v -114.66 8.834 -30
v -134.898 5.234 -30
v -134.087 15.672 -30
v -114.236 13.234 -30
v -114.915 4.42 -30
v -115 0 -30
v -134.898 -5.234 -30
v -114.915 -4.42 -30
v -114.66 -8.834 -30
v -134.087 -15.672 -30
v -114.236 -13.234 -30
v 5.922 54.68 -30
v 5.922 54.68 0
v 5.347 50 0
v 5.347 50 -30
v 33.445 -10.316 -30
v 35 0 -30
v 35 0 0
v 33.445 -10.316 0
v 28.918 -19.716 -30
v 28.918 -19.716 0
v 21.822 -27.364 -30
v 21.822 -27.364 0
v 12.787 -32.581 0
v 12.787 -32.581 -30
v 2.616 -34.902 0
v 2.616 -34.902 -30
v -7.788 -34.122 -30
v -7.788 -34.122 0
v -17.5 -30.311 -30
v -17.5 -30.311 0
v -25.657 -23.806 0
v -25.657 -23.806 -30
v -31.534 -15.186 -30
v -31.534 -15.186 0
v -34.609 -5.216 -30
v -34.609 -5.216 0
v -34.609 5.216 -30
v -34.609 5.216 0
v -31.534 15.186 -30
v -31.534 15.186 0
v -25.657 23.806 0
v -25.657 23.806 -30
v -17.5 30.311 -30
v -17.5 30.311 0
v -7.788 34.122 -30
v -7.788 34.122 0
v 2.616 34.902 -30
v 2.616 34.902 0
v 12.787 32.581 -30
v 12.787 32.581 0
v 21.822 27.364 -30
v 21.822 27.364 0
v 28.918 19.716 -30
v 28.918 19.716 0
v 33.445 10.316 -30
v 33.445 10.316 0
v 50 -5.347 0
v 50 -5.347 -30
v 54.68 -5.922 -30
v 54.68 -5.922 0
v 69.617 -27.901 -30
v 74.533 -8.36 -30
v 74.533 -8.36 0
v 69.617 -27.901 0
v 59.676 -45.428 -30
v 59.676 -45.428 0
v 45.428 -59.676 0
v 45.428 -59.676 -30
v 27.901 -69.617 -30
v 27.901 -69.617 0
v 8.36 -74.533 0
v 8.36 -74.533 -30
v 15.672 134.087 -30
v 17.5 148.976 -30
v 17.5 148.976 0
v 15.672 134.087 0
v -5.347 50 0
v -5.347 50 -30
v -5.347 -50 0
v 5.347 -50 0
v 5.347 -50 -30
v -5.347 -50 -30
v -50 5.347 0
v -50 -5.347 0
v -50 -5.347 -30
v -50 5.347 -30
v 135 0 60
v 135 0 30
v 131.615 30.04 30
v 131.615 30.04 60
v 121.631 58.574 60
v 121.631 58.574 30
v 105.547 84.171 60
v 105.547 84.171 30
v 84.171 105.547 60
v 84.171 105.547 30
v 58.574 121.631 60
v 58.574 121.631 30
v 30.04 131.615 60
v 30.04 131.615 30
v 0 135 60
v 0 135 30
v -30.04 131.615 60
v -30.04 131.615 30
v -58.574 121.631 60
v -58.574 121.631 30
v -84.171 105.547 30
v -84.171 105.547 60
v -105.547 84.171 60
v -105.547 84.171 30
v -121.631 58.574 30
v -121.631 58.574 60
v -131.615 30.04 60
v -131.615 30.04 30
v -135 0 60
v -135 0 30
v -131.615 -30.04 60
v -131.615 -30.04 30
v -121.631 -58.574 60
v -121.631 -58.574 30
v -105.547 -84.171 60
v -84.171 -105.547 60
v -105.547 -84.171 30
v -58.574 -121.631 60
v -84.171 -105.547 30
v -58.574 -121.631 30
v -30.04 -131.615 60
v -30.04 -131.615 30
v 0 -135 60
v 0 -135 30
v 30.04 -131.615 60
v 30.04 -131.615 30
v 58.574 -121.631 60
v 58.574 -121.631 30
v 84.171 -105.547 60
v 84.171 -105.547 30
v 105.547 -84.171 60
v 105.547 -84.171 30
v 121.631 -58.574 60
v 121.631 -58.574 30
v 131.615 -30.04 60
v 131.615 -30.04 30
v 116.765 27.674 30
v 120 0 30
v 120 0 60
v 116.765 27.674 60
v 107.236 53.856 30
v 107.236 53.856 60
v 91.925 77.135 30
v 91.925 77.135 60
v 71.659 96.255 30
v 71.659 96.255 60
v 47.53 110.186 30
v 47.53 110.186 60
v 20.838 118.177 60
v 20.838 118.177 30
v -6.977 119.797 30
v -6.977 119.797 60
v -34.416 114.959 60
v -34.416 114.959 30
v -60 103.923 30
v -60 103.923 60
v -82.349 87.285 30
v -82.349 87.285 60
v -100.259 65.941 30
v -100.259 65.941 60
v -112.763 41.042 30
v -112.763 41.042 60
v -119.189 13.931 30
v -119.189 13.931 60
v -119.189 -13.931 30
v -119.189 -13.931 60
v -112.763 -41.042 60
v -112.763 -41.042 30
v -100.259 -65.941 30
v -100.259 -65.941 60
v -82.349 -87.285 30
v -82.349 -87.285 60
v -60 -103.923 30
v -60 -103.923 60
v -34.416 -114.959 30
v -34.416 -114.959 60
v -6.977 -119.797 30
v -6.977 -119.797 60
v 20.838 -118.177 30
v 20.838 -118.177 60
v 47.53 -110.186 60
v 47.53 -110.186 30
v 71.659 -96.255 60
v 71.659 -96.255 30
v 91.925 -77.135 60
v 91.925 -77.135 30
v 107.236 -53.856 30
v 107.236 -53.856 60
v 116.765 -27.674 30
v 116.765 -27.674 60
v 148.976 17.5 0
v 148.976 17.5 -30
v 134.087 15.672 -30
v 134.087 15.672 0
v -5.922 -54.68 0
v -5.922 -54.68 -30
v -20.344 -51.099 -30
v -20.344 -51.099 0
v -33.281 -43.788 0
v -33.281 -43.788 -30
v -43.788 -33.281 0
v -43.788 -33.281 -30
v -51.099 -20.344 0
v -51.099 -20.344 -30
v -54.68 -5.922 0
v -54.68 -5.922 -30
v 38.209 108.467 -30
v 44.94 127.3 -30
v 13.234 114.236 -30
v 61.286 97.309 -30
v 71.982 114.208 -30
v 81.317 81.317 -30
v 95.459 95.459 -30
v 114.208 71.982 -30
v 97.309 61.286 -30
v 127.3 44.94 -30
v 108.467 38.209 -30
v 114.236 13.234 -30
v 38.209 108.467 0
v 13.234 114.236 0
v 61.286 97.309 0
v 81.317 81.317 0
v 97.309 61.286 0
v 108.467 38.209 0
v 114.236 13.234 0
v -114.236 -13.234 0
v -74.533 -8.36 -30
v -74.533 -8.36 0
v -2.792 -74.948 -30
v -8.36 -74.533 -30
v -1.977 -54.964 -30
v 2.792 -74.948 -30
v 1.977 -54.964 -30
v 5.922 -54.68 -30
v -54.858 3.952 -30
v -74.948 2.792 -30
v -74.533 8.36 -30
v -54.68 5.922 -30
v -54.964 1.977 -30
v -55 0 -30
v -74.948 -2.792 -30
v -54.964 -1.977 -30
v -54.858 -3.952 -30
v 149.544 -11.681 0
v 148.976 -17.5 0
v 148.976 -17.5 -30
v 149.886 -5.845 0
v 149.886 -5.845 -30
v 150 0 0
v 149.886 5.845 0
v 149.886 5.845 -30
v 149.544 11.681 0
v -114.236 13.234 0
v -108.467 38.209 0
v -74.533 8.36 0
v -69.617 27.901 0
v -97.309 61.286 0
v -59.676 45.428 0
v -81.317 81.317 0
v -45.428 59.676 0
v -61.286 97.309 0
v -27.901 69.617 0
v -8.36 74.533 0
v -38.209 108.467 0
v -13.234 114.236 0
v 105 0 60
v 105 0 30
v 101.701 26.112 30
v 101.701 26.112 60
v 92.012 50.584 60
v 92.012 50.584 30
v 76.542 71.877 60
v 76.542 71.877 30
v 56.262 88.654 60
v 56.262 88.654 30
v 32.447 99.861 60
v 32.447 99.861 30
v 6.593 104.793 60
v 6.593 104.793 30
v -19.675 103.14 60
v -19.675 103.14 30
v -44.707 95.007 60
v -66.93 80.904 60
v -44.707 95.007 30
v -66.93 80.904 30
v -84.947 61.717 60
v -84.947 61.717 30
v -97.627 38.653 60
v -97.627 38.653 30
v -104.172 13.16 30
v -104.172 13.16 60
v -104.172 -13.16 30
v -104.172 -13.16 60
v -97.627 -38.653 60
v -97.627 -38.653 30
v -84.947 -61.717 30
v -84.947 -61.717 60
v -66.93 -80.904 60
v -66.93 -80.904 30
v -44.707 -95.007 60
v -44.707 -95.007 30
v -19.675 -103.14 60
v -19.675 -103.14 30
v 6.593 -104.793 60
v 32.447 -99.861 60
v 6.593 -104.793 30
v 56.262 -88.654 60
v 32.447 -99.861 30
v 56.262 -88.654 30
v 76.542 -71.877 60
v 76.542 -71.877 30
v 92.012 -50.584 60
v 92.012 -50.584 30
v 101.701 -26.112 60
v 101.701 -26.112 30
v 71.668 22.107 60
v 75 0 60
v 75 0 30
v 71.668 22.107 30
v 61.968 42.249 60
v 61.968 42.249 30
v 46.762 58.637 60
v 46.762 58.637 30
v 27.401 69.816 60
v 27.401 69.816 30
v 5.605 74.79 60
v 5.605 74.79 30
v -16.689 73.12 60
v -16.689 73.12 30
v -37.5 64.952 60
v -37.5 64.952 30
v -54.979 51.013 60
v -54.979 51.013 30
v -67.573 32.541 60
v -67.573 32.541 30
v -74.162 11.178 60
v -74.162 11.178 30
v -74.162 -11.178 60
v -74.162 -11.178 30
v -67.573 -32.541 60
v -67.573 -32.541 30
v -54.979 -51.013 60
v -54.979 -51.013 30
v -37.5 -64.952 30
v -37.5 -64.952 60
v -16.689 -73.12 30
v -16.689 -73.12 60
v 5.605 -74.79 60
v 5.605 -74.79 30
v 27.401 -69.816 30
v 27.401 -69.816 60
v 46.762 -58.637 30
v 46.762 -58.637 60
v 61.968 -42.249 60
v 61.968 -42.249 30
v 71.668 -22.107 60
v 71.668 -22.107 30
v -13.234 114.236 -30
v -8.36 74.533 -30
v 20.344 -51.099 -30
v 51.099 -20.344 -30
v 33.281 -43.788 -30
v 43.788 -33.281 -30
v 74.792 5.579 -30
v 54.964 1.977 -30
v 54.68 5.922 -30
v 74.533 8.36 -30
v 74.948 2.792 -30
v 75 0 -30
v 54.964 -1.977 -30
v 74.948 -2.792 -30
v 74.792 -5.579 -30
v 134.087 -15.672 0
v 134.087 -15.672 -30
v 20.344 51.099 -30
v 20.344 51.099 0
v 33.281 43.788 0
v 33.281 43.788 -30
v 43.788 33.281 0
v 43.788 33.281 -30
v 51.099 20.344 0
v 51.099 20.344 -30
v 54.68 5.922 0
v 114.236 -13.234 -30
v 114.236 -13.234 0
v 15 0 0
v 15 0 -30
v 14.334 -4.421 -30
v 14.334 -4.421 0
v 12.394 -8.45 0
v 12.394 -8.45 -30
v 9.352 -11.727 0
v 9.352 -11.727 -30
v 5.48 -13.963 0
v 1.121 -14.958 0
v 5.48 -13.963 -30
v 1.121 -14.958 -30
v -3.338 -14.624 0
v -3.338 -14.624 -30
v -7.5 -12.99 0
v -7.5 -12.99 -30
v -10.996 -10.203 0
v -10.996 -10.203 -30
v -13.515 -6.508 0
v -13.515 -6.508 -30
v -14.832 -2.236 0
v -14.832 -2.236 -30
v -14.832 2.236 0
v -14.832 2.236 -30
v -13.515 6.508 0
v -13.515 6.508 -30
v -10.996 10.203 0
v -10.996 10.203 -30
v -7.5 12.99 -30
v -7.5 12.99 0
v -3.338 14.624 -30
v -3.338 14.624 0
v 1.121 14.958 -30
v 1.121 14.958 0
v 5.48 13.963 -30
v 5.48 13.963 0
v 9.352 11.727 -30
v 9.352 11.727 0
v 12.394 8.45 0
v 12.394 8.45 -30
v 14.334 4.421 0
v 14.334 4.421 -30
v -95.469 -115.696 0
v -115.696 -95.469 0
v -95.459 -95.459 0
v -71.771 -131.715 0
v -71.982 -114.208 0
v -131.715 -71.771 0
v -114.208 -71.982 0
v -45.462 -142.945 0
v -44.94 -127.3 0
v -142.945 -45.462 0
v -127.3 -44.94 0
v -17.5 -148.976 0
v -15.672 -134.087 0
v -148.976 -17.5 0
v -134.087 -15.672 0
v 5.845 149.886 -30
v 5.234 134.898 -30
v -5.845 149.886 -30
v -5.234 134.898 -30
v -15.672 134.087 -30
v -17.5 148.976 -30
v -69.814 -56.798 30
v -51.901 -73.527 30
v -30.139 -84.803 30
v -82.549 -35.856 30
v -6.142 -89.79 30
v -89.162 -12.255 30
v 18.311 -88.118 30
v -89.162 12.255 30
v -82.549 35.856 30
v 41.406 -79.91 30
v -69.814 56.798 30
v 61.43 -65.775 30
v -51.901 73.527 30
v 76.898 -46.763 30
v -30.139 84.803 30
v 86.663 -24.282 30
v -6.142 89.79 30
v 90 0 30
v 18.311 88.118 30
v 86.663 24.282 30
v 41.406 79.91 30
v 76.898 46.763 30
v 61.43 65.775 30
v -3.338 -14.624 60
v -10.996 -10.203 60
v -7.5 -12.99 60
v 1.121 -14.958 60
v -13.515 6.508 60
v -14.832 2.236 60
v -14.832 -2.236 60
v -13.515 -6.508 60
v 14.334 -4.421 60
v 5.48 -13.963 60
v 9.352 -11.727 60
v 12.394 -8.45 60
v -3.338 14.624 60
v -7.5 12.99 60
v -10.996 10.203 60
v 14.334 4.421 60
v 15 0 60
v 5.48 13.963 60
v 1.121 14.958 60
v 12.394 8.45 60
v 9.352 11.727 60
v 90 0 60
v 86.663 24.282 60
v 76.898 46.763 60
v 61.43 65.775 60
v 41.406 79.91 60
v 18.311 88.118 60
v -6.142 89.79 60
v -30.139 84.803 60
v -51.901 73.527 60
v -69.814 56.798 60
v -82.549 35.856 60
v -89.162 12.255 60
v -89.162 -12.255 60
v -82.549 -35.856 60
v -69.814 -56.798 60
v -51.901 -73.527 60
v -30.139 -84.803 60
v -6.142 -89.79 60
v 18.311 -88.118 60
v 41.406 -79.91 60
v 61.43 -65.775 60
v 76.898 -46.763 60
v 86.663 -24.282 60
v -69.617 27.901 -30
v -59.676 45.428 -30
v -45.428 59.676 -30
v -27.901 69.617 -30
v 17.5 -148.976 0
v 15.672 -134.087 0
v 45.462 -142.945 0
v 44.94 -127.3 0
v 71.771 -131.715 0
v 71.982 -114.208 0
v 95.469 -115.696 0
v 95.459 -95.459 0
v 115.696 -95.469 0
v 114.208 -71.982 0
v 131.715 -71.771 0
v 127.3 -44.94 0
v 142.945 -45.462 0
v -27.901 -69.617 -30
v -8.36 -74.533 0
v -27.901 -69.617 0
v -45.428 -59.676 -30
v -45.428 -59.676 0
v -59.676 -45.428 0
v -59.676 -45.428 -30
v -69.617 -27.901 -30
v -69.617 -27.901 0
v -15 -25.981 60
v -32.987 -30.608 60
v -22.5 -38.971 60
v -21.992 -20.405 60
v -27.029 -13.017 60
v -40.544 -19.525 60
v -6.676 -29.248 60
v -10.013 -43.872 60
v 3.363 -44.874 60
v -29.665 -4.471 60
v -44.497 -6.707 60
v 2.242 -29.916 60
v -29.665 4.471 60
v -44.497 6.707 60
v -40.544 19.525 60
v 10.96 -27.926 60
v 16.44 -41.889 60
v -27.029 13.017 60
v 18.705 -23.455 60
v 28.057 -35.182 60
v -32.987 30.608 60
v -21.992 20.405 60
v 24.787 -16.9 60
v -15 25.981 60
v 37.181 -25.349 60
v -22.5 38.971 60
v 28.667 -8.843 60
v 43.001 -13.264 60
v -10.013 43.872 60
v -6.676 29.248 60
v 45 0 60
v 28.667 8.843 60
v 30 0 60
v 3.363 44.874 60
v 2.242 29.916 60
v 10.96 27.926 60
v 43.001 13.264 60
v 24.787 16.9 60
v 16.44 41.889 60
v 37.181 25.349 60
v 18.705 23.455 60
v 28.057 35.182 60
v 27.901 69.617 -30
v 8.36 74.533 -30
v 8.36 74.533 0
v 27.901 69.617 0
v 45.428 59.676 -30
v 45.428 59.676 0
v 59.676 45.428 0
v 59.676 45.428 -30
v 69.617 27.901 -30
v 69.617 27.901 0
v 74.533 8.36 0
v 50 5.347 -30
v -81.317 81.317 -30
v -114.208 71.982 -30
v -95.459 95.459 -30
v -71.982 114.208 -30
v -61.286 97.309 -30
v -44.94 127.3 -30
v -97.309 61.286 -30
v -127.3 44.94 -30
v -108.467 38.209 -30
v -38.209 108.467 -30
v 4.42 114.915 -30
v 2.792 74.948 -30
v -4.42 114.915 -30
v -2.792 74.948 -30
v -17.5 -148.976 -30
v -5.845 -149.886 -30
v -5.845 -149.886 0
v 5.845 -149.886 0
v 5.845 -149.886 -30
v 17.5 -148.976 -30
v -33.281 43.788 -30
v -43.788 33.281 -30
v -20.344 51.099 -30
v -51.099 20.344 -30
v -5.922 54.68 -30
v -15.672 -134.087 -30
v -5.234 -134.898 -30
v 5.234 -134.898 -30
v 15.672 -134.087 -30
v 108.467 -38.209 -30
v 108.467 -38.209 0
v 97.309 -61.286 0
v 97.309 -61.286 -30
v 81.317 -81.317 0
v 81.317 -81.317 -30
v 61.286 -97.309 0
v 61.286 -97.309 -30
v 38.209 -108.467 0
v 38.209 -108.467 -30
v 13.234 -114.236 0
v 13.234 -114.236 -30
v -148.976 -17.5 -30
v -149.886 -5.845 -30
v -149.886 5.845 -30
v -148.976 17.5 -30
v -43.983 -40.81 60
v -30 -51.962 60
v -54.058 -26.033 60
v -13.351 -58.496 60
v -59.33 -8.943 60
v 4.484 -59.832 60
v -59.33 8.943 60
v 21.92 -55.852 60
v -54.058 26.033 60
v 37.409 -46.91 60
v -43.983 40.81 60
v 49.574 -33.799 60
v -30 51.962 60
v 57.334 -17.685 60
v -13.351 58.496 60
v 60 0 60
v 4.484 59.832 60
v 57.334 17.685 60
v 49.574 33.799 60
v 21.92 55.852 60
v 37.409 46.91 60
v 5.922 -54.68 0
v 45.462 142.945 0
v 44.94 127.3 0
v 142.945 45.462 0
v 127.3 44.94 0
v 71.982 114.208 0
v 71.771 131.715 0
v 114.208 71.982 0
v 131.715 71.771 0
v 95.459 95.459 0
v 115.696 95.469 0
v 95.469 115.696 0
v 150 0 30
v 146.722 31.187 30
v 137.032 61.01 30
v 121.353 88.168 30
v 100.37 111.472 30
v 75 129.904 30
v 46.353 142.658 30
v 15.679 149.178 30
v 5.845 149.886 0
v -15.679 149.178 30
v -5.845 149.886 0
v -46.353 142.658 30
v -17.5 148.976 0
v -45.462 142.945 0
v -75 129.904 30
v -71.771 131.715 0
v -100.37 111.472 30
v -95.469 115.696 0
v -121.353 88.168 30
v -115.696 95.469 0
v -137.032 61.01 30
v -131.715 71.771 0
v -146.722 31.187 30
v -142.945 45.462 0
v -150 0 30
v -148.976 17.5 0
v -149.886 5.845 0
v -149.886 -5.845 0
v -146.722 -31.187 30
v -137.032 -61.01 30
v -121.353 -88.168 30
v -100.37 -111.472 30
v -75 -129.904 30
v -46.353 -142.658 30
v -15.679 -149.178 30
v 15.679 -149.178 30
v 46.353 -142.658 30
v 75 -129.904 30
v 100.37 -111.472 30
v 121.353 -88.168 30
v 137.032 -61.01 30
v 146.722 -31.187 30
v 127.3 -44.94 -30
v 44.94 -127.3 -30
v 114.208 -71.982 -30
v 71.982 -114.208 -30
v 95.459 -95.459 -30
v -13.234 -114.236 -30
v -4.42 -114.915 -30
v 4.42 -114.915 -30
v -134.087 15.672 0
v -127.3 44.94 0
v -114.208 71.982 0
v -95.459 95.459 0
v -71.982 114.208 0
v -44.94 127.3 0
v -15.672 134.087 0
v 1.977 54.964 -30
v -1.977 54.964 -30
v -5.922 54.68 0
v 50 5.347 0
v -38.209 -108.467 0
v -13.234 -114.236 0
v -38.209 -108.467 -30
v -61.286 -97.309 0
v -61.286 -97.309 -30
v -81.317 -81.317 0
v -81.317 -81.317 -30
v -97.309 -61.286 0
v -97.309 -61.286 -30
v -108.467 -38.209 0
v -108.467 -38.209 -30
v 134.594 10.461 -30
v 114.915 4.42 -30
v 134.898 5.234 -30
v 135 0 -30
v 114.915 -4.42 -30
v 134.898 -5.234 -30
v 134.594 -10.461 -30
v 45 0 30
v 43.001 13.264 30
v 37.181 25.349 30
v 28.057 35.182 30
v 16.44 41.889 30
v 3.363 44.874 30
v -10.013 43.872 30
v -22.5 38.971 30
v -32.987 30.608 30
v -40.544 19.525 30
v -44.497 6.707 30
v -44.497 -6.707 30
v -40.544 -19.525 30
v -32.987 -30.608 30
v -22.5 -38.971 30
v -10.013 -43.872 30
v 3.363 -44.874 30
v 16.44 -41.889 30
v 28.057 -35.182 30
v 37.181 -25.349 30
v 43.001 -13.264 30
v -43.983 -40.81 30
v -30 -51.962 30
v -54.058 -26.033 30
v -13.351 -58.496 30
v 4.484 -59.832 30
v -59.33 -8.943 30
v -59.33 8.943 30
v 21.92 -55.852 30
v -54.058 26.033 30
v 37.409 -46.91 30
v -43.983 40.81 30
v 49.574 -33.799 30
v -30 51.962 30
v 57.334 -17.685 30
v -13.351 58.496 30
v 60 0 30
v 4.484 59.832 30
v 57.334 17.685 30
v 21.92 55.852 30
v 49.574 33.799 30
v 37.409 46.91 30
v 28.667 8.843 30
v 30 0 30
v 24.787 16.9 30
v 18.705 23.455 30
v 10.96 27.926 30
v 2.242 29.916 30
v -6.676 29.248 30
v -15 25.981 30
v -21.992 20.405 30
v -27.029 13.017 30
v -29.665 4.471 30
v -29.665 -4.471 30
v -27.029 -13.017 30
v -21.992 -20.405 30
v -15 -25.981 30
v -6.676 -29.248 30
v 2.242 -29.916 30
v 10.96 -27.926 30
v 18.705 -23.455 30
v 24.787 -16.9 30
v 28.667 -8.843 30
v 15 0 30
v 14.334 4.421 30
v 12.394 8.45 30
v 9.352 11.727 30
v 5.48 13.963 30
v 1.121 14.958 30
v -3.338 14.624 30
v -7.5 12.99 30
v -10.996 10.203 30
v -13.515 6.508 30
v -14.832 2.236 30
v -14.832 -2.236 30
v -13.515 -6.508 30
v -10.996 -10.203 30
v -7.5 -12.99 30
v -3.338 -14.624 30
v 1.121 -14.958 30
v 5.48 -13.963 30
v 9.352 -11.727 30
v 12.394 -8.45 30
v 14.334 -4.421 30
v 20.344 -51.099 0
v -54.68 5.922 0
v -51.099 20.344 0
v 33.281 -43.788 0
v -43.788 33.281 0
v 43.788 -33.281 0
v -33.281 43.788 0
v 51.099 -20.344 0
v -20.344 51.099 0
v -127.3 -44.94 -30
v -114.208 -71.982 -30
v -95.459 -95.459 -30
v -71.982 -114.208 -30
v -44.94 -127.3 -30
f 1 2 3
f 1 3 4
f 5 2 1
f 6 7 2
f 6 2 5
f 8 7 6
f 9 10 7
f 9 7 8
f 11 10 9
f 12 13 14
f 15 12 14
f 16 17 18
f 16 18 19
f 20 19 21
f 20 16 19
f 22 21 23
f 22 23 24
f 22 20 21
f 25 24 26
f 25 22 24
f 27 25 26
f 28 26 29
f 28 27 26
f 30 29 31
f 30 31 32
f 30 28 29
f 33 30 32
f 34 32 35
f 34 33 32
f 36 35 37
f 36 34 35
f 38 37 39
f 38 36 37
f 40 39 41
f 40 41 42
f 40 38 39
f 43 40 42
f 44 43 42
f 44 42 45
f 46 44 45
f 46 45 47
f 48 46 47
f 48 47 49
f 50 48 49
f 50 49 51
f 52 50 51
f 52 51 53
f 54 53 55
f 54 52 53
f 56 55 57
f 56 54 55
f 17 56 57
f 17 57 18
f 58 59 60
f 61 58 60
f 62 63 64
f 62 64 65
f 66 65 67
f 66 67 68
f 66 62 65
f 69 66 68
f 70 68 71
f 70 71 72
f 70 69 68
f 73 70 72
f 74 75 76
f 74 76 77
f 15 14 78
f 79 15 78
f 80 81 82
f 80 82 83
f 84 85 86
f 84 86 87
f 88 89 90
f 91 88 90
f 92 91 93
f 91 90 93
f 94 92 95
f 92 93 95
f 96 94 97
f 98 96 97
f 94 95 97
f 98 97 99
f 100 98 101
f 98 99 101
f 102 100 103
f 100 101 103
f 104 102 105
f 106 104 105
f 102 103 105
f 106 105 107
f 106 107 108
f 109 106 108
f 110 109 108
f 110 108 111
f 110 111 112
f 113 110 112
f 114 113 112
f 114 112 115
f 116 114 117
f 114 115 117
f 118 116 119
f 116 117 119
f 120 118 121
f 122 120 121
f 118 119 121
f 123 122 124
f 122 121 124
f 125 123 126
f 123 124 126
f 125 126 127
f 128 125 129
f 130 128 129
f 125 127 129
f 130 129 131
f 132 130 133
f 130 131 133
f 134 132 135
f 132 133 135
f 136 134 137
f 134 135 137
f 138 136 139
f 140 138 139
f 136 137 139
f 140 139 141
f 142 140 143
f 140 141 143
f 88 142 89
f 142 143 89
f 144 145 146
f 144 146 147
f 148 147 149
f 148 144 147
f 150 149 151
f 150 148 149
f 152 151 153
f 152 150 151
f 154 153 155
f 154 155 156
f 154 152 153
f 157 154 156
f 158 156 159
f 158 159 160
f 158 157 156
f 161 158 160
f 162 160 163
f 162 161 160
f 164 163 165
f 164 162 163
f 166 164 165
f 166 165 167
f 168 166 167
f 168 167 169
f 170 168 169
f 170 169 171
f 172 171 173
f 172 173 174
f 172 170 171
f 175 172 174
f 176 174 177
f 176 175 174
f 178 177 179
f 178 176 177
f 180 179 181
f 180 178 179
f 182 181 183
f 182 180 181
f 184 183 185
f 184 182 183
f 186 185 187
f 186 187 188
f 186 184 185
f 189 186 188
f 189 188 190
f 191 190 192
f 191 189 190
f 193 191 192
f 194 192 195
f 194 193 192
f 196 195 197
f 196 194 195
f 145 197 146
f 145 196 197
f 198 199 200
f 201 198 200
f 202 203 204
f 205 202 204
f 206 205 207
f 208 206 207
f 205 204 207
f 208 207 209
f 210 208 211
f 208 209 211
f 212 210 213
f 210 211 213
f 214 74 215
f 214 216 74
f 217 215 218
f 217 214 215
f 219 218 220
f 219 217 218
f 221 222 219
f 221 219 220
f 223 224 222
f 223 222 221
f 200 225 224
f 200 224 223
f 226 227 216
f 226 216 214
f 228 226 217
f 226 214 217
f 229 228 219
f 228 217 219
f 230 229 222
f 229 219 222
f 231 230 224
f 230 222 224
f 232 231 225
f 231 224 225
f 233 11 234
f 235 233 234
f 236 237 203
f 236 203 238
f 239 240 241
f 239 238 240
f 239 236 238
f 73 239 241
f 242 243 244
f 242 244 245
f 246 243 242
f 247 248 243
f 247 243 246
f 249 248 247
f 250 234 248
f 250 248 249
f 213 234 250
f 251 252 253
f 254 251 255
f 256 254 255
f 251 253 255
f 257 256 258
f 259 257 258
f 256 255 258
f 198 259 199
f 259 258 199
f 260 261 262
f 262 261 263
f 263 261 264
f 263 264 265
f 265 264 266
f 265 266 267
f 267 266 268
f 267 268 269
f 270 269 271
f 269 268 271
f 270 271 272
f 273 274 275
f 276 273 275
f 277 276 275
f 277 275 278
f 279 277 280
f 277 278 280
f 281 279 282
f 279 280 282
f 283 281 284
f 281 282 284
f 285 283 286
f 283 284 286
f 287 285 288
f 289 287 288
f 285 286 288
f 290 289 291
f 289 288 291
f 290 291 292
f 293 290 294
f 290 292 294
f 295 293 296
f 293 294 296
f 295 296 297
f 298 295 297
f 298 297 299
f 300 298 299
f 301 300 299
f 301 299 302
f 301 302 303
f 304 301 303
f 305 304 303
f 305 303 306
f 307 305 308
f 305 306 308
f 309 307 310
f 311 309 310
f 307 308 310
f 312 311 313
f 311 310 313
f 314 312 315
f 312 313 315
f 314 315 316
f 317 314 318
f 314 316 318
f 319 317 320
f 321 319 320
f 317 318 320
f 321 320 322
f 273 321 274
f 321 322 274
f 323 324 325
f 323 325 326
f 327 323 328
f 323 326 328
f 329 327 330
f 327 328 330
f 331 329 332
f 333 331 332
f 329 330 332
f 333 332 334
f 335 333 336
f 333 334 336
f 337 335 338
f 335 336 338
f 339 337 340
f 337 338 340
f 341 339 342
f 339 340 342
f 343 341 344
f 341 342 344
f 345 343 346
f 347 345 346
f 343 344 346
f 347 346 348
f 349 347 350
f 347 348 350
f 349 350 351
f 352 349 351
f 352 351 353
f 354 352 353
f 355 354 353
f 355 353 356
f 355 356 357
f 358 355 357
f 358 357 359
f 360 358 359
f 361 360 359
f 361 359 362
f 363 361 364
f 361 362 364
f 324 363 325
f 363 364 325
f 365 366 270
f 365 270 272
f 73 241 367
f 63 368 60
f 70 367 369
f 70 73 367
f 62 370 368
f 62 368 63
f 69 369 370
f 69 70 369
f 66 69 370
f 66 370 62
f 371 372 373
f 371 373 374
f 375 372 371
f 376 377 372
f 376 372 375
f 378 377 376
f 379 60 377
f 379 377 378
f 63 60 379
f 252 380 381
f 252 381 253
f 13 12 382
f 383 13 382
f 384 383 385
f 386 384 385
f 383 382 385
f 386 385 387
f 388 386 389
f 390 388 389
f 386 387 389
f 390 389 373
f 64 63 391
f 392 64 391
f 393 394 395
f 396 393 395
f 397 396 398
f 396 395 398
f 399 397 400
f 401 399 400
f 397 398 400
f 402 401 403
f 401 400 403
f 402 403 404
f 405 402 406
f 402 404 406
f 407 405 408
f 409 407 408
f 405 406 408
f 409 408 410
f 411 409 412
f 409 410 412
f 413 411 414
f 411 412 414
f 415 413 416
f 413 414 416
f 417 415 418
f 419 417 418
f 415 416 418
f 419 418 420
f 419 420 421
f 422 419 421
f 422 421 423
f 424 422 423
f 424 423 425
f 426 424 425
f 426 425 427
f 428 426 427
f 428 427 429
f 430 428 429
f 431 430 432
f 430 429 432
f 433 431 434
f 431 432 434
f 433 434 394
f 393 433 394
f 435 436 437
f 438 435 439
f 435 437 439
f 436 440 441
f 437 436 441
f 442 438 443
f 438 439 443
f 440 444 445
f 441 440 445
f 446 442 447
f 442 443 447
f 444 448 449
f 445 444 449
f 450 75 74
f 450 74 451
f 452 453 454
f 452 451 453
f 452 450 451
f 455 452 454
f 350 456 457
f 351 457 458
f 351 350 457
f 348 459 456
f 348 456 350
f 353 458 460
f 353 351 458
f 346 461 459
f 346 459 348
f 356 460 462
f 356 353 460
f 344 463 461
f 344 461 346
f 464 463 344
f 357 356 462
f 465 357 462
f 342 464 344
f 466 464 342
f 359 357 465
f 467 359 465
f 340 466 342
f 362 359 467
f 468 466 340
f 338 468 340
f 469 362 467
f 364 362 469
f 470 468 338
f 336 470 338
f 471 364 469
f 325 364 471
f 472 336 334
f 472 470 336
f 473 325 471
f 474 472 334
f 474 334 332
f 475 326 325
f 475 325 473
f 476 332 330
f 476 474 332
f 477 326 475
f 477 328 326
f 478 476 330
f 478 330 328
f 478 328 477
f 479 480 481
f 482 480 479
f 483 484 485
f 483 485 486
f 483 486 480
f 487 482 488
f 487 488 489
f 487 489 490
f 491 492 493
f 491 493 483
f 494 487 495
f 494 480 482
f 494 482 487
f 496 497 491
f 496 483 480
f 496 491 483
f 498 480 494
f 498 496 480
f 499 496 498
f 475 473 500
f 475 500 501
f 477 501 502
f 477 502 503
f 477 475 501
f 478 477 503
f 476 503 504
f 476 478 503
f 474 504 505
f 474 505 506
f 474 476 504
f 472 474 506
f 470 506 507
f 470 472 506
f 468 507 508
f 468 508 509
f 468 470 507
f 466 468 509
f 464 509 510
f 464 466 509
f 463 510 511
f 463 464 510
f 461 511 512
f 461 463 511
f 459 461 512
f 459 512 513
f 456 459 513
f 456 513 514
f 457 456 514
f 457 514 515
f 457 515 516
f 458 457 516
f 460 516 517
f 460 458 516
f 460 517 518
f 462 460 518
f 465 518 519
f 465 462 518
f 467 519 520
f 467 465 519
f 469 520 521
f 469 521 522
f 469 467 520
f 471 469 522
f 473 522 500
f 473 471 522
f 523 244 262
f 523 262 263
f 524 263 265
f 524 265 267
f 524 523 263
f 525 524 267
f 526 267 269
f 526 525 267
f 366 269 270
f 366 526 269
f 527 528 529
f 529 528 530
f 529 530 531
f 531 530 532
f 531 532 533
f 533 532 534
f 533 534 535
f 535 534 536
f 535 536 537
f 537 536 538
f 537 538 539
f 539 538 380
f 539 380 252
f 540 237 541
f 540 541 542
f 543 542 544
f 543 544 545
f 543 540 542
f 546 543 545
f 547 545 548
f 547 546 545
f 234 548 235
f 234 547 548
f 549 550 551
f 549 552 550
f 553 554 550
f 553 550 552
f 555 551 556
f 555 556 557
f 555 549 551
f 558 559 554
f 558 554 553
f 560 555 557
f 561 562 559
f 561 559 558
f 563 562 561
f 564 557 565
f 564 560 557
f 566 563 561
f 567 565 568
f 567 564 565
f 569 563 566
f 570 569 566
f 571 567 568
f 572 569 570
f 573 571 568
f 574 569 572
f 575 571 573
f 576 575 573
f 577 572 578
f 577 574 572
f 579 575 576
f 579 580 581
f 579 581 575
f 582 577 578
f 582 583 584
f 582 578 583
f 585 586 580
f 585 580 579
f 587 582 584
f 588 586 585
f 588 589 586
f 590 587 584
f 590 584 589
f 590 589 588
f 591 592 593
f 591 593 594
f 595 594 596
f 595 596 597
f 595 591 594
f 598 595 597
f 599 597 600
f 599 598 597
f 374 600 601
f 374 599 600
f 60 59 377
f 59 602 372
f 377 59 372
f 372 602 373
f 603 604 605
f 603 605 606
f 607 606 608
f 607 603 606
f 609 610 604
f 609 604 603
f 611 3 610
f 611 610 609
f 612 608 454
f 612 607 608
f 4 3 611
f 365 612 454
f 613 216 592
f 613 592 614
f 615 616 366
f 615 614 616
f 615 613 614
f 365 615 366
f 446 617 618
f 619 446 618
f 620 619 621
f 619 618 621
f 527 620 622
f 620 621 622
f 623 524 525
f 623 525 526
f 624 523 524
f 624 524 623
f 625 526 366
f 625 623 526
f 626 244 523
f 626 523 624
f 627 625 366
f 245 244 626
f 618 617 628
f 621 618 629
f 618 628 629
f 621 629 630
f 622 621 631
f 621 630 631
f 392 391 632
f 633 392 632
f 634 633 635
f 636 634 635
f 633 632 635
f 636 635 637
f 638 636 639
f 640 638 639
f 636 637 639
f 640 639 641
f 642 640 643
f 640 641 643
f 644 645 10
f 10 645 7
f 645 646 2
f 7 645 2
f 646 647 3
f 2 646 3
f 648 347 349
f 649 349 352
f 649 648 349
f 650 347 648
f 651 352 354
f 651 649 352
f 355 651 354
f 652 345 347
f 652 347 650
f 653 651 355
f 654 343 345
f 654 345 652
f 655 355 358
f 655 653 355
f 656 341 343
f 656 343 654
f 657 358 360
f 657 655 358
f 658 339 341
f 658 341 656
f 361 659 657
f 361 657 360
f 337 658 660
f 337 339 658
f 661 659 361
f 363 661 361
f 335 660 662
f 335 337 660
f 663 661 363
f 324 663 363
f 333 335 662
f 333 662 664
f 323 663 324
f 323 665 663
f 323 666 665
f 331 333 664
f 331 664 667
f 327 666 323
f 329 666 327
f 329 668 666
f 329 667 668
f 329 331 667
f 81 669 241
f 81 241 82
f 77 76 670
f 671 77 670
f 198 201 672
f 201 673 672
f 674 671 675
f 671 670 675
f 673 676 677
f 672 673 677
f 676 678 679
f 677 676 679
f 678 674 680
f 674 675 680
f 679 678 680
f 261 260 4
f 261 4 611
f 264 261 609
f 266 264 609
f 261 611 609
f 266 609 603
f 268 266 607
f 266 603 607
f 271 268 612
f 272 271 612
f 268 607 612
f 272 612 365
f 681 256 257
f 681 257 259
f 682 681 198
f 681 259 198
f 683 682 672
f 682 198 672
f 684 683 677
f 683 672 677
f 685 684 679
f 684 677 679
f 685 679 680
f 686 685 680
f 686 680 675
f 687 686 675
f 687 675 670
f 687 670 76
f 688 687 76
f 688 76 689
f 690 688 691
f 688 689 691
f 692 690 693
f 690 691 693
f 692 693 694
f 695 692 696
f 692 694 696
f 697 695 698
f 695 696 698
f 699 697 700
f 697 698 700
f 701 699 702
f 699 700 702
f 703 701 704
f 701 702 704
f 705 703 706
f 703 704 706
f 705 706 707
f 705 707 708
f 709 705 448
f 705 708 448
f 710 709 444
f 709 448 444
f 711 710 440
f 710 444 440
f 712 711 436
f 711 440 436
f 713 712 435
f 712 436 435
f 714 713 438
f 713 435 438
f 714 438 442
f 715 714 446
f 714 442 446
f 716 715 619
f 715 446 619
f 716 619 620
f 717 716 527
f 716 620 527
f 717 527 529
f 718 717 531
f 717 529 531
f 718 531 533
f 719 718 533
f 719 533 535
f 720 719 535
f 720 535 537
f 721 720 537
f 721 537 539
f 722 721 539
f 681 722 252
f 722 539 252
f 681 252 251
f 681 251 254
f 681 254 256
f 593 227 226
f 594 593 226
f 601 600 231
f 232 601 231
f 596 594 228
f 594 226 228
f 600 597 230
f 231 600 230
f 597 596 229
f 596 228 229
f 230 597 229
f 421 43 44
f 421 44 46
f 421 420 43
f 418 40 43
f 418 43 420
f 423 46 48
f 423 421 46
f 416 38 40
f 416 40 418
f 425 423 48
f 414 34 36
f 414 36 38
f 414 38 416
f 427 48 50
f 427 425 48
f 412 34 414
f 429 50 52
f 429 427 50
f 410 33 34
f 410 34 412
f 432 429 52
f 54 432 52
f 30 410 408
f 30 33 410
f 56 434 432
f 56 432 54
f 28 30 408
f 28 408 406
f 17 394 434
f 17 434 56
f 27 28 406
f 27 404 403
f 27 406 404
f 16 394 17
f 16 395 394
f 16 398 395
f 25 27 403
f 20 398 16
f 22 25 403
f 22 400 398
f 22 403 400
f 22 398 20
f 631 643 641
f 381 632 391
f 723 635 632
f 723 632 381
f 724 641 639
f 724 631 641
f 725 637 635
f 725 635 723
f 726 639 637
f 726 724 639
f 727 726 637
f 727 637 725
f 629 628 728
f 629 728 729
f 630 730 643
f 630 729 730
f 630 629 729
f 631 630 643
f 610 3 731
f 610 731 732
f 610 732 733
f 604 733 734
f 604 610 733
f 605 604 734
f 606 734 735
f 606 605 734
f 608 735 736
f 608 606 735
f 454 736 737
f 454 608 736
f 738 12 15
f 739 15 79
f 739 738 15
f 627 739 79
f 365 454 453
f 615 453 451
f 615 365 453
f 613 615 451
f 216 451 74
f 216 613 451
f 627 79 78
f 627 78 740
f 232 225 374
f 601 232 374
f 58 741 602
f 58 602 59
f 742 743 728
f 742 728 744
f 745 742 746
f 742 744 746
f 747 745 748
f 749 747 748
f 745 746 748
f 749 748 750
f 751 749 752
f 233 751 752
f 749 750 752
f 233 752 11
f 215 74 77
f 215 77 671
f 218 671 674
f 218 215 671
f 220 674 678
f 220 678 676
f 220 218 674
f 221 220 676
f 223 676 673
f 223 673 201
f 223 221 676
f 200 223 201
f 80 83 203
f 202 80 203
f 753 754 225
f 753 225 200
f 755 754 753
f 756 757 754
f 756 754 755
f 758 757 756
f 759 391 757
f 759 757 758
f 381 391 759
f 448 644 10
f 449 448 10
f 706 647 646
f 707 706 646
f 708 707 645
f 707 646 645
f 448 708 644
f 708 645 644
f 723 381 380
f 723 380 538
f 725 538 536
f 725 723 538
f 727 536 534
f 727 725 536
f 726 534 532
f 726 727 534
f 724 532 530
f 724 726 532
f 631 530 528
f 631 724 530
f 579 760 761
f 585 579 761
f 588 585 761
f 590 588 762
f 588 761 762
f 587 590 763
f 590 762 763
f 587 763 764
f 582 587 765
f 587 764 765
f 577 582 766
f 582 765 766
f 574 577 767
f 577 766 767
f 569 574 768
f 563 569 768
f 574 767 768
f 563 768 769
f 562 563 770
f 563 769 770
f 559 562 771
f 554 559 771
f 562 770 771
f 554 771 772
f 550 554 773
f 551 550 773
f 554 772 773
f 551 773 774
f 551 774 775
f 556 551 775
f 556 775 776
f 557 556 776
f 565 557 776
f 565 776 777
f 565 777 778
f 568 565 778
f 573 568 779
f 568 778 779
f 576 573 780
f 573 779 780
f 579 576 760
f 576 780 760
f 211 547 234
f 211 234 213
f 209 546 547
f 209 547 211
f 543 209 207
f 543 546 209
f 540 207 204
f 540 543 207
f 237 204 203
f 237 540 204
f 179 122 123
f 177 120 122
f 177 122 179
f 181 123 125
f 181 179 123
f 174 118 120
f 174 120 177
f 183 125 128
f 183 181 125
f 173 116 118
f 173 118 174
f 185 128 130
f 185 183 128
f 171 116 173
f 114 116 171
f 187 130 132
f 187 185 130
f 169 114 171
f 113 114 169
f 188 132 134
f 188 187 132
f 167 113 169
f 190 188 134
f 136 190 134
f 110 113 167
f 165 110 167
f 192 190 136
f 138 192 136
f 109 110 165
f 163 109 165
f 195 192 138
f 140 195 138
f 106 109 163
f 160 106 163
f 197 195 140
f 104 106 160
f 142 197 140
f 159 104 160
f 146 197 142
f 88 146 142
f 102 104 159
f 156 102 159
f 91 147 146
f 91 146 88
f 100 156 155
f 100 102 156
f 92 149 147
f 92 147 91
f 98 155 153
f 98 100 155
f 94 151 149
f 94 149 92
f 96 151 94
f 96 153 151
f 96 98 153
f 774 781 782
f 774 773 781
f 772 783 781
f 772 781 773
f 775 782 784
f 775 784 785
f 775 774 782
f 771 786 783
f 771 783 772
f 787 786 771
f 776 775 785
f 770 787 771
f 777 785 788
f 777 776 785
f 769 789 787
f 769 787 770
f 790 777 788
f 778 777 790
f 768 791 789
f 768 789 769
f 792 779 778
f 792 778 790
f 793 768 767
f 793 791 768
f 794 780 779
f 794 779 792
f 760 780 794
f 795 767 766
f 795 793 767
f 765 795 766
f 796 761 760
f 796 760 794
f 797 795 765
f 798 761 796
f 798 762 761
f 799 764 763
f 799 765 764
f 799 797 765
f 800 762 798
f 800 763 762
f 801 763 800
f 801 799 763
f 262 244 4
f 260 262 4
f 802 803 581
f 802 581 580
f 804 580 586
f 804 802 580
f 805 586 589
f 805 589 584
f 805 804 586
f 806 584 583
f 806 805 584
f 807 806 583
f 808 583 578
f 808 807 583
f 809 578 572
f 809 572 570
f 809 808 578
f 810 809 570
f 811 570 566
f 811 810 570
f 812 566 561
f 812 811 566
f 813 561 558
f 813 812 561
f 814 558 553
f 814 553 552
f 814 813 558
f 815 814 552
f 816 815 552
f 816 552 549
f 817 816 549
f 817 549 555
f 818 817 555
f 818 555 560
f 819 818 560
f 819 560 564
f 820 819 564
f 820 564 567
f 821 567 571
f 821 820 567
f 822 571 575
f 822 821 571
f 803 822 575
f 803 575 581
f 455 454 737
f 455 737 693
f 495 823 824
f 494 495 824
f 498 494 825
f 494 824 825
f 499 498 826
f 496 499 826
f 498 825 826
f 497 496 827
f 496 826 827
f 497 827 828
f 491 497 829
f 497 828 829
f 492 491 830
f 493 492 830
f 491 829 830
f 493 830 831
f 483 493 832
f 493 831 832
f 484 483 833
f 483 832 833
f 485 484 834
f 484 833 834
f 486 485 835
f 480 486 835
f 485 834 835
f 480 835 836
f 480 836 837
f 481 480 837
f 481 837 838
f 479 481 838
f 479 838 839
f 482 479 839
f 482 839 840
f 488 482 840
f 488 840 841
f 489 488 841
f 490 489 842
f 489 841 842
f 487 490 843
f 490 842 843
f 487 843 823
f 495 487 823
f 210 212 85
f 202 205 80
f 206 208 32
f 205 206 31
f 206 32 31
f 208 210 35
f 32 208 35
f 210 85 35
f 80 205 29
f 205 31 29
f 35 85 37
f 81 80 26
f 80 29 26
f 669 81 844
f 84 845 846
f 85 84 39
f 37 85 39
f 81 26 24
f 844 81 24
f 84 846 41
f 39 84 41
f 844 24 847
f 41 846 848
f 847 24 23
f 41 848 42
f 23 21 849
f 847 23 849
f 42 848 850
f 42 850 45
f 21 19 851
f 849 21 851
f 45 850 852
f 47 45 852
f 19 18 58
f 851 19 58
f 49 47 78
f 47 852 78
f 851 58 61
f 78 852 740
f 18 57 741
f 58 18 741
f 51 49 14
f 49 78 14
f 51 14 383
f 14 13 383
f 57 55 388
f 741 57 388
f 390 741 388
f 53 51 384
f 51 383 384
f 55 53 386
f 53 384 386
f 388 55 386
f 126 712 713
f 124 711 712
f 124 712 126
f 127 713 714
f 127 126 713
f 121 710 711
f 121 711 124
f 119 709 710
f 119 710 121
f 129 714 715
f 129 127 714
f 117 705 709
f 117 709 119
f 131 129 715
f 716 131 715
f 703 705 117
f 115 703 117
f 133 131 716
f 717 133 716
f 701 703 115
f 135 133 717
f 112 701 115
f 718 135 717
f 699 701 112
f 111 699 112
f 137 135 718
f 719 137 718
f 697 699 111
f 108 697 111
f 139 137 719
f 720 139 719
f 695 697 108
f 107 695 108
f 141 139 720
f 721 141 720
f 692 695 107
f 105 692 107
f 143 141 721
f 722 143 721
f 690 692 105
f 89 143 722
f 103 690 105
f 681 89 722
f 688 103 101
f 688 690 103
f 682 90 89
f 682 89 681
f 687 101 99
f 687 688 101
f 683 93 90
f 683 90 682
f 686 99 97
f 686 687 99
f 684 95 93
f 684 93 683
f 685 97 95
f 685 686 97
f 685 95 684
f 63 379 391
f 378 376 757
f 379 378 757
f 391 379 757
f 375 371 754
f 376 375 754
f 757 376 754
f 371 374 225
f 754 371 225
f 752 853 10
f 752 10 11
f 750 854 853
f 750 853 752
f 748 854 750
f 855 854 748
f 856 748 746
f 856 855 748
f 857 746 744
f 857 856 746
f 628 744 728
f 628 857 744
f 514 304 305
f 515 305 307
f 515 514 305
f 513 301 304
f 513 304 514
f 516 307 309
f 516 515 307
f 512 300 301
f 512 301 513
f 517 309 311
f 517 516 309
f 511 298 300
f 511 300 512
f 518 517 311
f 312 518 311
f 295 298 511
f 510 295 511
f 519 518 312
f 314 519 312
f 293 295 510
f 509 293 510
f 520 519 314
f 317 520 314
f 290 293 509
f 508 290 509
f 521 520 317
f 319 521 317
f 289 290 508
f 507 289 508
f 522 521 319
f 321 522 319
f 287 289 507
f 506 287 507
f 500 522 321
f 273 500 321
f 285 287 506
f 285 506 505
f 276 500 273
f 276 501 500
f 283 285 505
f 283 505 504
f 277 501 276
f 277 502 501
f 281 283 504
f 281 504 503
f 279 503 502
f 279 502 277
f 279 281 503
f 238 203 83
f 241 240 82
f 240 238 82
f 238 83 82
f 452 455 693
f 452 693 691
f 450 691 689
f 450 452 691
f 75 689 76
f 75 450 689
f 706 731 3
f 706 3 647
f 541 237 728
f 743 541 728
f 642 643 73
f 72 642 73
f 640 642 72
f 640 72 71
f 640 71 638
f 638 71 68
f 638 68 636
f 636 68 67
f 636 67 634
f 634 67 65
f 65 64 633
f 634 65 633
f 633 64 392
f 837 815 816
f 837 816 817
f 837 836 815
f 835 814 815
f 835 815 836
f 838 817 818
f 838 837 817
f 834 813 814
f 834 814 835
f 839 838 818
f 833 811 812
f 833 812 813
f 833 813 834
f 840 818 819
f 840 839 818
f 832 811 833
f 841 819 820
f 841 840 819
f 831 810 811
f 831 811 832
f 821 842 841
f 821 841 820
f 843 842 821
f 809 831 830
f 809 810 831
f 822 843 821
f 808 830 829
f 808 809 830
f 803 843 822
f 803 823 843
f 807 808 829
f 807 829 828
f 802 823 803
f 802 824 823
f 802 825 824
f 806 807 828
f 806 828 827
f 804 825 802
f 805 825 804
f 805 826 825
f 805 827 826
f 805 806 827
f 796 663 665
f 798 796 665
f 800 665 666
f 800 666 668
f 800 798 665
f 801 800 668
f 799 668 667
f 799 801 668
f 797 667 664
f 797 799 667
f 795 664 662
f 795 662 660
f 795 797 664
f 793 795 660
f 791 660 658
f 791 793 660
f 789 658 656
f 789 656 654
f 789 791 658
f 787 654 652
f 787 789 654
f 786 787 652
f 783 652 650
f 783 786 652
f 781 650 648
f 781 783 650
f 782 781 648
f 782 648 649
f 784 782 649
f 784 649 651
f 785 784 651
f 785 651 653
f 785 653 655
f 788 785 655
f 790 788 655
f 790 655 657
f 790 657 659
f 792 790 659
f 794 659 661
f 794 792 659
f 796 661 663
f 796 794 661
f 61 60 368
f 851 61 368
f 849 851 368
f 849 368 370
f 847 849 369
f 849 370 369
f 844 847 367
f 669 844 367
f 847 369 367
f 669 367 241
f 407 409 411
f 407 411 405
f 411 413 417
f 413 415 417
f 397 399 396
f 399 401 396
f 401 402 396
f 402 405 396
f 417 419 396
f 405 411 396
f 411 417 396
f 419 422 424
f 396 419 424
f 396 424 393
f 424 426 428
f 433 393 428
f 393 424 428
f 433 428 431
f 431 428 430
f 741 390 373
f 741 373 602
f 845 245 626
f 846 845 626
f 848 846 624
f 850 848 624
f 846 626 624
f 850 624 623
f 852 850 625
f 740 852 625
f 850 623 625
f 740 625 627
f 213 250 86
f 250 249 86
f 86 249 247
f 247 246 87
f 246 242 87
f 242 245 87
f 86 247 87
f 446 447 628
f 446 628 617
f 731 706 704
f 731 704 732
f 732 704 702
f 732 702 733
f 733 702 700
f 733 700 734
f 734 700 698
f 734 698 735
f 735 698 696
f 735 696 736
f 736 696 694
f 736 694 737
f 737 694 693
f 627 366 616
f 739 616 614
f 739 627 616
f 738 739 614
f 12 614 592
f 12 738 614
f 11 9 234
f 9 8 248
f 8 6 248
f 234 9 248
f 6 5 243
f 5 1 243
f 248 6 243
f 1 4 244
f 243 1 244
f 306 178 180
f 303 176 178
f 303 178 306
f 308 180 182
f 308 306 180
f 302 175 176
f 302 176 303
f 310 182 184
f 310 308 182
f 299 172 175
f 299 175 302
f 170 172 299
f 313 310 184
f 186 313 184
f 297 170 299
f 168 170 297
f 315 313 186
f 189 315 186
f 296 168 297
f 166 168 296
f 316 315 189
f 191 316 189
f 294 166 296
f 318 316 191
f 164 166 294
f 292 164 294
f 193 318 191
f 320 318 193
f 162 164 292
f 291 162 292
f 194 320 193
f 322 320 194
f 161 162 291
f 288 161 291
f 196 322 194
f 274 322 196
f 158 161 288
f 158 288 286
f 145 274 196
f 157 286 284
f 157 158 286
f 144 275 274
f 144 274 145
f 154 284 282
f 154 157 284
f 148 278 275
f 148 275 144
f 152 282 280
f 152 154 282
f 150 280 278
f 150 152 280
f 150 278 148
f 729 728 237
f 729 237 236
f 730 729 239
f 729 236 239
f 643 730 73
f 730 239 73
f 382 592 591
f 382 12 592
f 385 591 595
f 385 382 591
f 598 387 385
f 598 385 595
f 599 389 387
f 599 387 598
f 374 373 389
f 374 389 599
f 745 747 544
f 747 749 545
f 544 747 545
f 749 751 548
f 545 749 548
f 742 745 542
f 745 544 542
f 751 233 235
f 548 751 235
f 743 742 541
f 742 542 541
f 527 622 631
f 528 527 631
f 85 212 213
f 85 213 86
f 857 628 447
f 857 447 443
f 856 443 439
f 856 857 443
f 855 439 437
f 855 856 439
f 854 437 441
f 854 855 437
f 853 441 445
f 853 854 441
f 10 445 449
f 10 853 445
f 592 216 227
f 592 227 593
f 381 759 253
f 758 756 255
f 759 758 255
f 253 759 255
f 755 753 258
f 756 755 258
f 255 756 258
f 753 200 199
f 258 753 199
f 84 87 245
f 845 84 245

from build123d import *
from build123d.topology import SkipClean

# Parameters (mm, degrees)
SKETCH1_R           = 150
BOSS_EXTRUDE1_DEPTH = 30
SKETCH2_R           = 135
SKETCH2_R_2         = 120
SKETCH2_R_3         = 105
SKETCH2_R_4         = 90
SKETCH2_R_5         = 75
SKETCH2_R_6         = 60
SKETCH2_R_7         = 45
SKETCH2_R_8         = 30
SKETCH2_R_9         = 15
BOSS_EXTRUDE2_DEPTH = 30
BOSS_EXTRUDE3_START = 30
SKETCH3_R           = 135
SKETCH3_R_2         = 115
SKETCH3_R_3         = 75
SKETCH3_R_4         = 55
SKETCH3_R_5         = 35
SKETCH3_R_6         = 15
BOSS_EXTRUDE3_DEPTH = 30
BOSS_EXTRUDE4_START = 30
BOSS_EXTRUDE4_DEPTH = 30


with BuildPart() as part:
    # Sketch1 → Boss-Extrude1 (new body)
    with BuildSketch(Plane.XY):
        Circle(SKETCH1_R)
    extrude(amount=BOSS_EXTRUDE1_DEPTH)

    # Sketch2 → Boss-Extrude2 (add)
    # profile 1 of 5: a face of its own
    with BuildSketch(Plane.XY.offset(30)):
        Circle(SKETCH2_R)
        Circle(SKETCH2_R_2, mode=Mode.SUBTRACT)
    # profile 2 of 5: a face of its own
    with BuildSketch(Plane.XY.offset(30)):
        Circle(SKETCH2_R_3)
        Circle(SKETCH2_R_4, mode=Mode.SUBTRACT)
    # profile 3 of 5: a face of its own
    with BuildSketch(Plane.XY.offset(30)):
        Circle(SKETCH2_R_5)
        Circle(SKETCH2_R_6, mode=Mode.SUBTRACT)
    # profile 4 of 5: a face of its own
    with BuildSketch(Plane.XY.offset(30)):
        Circle(SKETCH2_R_7)
        Circle(SKETCH2_R_8, mode=Mode.SUBTRACT)
    # profile 5 of 5: a face of its own
    with BuildSketch(Plane.XY.offset(30)):
        Circle(SKETCH2_R_9)
    extrude(amount=BOSS_EXTRUDE2_DEPTH)

    # Sketch3 → Boss-Extrude3 (add)
    # profile 1 of 3: a face of its own
    with BuildSketch(Plane(origin=(0, 0, 0), x_dir=(-1, 0, 0), z_dir=(0, 0, -1)).offset(BOSS_EXTRUDE3_START)):
        with Locations(Location((0, 0, 0), (0, 0, 180))):
            Circle(SKETCH3_R)
        Circle(SKETCH3_R_2, mode=Mode.SUBTRACT)
    # profile 2 of 3: a face of its own
    with BuildSketch(Plane(origin=(0, 0, 0), x_dir=(-1, 0, 0), z_dir=(0, 0, -1)).offset(BOSS_EXTRUDE3_START)):
        with Locations(Location((0, 0, 0), (0, 0, 180))):
            Circle(SKETCH3_R_3)
        Circle(SKETCH3_R_4, mode=Mode.SUBTRACT)
    # profile 3 of 3: a face of its own
    with BuildSketch(Plane(origin=(0, 0, 0), x_dir=(-1, 0, 0), z_dir=(0, 0, -1)).offset(BOSS_EXTRUDE3_START)):
        with Locations(Location((0, 0, 0), (0, 0, 180))):
            Circle(SKETCH3_R_5)
        with Locations(Location((0, 0, 0), (0, 0, 180))):
            Circle(SKETCH3_R_6, mode=Mode.SUBTRACT)
    extrude(amount=-BOSS_EXTRUDE3_DEPTH)

    # Sketch4 → Boss-Extrude4 (add)
    with SkipClean():  # the faces are left unmerged after this step: merging them gives an invalid solid
        with BuildSketch(Plane(origin=(0, 0, 0), x_dir=(-1, 0, 0), z_dir=(0, 0, -1)).offset(BOSS_EXTRUDE4_START)):
            with BuildLine():
                Line((-5.347315923, 50), (5.347315923, 50))
                Line((5.347315923, 50), (17.5, 148.975669154))
                ThreePointArc((17.5, 148.975669154), (0, 150), (-17.5, 148.975669154))
                Line((-17.5, 148.975669154), (-5.347315923, 50))
            make_face()
            with BuildLine():
                Line((50, 5.347315923), (148.975669154, 17.5))
                ThreePointArc((148.975669154, 17.5), (150, 0), (148.975669154, -17.5))
                Line((148.975669154, -17.5), (50, -5.347315923))
                Line((50, -5.347315923), (50, 5.347315923))
            make_face()
            with BuildLine():
                Line((5.347315923, -50), (17.5, -148.975669154))
                ThreePointArc((17.5, -148.975669154), (0, -150), (-17.5, -148.975669154))
                Line((-17.5, -148.975669154), (-5.347315923, -50))
                Line((-5.347315923, -50), (5.347315923, -50))
            make_face()
            with BuildLine():
                Line((-50, -5.347315923), (-148.975669154, -17.5))
                ThreePointArc((-148.975669154, -17.5), (-150, 0), (-148.975669154, 17.5))
                Line((-148.975669154, 17.5), (-50, 5.347315923))
                Line((-50, 5.347315923), (-50, -5.347315923))
            make_face()
        extrude(amount=-BOSS_EXTRUDE4_DEPTH)


solid = part.part
